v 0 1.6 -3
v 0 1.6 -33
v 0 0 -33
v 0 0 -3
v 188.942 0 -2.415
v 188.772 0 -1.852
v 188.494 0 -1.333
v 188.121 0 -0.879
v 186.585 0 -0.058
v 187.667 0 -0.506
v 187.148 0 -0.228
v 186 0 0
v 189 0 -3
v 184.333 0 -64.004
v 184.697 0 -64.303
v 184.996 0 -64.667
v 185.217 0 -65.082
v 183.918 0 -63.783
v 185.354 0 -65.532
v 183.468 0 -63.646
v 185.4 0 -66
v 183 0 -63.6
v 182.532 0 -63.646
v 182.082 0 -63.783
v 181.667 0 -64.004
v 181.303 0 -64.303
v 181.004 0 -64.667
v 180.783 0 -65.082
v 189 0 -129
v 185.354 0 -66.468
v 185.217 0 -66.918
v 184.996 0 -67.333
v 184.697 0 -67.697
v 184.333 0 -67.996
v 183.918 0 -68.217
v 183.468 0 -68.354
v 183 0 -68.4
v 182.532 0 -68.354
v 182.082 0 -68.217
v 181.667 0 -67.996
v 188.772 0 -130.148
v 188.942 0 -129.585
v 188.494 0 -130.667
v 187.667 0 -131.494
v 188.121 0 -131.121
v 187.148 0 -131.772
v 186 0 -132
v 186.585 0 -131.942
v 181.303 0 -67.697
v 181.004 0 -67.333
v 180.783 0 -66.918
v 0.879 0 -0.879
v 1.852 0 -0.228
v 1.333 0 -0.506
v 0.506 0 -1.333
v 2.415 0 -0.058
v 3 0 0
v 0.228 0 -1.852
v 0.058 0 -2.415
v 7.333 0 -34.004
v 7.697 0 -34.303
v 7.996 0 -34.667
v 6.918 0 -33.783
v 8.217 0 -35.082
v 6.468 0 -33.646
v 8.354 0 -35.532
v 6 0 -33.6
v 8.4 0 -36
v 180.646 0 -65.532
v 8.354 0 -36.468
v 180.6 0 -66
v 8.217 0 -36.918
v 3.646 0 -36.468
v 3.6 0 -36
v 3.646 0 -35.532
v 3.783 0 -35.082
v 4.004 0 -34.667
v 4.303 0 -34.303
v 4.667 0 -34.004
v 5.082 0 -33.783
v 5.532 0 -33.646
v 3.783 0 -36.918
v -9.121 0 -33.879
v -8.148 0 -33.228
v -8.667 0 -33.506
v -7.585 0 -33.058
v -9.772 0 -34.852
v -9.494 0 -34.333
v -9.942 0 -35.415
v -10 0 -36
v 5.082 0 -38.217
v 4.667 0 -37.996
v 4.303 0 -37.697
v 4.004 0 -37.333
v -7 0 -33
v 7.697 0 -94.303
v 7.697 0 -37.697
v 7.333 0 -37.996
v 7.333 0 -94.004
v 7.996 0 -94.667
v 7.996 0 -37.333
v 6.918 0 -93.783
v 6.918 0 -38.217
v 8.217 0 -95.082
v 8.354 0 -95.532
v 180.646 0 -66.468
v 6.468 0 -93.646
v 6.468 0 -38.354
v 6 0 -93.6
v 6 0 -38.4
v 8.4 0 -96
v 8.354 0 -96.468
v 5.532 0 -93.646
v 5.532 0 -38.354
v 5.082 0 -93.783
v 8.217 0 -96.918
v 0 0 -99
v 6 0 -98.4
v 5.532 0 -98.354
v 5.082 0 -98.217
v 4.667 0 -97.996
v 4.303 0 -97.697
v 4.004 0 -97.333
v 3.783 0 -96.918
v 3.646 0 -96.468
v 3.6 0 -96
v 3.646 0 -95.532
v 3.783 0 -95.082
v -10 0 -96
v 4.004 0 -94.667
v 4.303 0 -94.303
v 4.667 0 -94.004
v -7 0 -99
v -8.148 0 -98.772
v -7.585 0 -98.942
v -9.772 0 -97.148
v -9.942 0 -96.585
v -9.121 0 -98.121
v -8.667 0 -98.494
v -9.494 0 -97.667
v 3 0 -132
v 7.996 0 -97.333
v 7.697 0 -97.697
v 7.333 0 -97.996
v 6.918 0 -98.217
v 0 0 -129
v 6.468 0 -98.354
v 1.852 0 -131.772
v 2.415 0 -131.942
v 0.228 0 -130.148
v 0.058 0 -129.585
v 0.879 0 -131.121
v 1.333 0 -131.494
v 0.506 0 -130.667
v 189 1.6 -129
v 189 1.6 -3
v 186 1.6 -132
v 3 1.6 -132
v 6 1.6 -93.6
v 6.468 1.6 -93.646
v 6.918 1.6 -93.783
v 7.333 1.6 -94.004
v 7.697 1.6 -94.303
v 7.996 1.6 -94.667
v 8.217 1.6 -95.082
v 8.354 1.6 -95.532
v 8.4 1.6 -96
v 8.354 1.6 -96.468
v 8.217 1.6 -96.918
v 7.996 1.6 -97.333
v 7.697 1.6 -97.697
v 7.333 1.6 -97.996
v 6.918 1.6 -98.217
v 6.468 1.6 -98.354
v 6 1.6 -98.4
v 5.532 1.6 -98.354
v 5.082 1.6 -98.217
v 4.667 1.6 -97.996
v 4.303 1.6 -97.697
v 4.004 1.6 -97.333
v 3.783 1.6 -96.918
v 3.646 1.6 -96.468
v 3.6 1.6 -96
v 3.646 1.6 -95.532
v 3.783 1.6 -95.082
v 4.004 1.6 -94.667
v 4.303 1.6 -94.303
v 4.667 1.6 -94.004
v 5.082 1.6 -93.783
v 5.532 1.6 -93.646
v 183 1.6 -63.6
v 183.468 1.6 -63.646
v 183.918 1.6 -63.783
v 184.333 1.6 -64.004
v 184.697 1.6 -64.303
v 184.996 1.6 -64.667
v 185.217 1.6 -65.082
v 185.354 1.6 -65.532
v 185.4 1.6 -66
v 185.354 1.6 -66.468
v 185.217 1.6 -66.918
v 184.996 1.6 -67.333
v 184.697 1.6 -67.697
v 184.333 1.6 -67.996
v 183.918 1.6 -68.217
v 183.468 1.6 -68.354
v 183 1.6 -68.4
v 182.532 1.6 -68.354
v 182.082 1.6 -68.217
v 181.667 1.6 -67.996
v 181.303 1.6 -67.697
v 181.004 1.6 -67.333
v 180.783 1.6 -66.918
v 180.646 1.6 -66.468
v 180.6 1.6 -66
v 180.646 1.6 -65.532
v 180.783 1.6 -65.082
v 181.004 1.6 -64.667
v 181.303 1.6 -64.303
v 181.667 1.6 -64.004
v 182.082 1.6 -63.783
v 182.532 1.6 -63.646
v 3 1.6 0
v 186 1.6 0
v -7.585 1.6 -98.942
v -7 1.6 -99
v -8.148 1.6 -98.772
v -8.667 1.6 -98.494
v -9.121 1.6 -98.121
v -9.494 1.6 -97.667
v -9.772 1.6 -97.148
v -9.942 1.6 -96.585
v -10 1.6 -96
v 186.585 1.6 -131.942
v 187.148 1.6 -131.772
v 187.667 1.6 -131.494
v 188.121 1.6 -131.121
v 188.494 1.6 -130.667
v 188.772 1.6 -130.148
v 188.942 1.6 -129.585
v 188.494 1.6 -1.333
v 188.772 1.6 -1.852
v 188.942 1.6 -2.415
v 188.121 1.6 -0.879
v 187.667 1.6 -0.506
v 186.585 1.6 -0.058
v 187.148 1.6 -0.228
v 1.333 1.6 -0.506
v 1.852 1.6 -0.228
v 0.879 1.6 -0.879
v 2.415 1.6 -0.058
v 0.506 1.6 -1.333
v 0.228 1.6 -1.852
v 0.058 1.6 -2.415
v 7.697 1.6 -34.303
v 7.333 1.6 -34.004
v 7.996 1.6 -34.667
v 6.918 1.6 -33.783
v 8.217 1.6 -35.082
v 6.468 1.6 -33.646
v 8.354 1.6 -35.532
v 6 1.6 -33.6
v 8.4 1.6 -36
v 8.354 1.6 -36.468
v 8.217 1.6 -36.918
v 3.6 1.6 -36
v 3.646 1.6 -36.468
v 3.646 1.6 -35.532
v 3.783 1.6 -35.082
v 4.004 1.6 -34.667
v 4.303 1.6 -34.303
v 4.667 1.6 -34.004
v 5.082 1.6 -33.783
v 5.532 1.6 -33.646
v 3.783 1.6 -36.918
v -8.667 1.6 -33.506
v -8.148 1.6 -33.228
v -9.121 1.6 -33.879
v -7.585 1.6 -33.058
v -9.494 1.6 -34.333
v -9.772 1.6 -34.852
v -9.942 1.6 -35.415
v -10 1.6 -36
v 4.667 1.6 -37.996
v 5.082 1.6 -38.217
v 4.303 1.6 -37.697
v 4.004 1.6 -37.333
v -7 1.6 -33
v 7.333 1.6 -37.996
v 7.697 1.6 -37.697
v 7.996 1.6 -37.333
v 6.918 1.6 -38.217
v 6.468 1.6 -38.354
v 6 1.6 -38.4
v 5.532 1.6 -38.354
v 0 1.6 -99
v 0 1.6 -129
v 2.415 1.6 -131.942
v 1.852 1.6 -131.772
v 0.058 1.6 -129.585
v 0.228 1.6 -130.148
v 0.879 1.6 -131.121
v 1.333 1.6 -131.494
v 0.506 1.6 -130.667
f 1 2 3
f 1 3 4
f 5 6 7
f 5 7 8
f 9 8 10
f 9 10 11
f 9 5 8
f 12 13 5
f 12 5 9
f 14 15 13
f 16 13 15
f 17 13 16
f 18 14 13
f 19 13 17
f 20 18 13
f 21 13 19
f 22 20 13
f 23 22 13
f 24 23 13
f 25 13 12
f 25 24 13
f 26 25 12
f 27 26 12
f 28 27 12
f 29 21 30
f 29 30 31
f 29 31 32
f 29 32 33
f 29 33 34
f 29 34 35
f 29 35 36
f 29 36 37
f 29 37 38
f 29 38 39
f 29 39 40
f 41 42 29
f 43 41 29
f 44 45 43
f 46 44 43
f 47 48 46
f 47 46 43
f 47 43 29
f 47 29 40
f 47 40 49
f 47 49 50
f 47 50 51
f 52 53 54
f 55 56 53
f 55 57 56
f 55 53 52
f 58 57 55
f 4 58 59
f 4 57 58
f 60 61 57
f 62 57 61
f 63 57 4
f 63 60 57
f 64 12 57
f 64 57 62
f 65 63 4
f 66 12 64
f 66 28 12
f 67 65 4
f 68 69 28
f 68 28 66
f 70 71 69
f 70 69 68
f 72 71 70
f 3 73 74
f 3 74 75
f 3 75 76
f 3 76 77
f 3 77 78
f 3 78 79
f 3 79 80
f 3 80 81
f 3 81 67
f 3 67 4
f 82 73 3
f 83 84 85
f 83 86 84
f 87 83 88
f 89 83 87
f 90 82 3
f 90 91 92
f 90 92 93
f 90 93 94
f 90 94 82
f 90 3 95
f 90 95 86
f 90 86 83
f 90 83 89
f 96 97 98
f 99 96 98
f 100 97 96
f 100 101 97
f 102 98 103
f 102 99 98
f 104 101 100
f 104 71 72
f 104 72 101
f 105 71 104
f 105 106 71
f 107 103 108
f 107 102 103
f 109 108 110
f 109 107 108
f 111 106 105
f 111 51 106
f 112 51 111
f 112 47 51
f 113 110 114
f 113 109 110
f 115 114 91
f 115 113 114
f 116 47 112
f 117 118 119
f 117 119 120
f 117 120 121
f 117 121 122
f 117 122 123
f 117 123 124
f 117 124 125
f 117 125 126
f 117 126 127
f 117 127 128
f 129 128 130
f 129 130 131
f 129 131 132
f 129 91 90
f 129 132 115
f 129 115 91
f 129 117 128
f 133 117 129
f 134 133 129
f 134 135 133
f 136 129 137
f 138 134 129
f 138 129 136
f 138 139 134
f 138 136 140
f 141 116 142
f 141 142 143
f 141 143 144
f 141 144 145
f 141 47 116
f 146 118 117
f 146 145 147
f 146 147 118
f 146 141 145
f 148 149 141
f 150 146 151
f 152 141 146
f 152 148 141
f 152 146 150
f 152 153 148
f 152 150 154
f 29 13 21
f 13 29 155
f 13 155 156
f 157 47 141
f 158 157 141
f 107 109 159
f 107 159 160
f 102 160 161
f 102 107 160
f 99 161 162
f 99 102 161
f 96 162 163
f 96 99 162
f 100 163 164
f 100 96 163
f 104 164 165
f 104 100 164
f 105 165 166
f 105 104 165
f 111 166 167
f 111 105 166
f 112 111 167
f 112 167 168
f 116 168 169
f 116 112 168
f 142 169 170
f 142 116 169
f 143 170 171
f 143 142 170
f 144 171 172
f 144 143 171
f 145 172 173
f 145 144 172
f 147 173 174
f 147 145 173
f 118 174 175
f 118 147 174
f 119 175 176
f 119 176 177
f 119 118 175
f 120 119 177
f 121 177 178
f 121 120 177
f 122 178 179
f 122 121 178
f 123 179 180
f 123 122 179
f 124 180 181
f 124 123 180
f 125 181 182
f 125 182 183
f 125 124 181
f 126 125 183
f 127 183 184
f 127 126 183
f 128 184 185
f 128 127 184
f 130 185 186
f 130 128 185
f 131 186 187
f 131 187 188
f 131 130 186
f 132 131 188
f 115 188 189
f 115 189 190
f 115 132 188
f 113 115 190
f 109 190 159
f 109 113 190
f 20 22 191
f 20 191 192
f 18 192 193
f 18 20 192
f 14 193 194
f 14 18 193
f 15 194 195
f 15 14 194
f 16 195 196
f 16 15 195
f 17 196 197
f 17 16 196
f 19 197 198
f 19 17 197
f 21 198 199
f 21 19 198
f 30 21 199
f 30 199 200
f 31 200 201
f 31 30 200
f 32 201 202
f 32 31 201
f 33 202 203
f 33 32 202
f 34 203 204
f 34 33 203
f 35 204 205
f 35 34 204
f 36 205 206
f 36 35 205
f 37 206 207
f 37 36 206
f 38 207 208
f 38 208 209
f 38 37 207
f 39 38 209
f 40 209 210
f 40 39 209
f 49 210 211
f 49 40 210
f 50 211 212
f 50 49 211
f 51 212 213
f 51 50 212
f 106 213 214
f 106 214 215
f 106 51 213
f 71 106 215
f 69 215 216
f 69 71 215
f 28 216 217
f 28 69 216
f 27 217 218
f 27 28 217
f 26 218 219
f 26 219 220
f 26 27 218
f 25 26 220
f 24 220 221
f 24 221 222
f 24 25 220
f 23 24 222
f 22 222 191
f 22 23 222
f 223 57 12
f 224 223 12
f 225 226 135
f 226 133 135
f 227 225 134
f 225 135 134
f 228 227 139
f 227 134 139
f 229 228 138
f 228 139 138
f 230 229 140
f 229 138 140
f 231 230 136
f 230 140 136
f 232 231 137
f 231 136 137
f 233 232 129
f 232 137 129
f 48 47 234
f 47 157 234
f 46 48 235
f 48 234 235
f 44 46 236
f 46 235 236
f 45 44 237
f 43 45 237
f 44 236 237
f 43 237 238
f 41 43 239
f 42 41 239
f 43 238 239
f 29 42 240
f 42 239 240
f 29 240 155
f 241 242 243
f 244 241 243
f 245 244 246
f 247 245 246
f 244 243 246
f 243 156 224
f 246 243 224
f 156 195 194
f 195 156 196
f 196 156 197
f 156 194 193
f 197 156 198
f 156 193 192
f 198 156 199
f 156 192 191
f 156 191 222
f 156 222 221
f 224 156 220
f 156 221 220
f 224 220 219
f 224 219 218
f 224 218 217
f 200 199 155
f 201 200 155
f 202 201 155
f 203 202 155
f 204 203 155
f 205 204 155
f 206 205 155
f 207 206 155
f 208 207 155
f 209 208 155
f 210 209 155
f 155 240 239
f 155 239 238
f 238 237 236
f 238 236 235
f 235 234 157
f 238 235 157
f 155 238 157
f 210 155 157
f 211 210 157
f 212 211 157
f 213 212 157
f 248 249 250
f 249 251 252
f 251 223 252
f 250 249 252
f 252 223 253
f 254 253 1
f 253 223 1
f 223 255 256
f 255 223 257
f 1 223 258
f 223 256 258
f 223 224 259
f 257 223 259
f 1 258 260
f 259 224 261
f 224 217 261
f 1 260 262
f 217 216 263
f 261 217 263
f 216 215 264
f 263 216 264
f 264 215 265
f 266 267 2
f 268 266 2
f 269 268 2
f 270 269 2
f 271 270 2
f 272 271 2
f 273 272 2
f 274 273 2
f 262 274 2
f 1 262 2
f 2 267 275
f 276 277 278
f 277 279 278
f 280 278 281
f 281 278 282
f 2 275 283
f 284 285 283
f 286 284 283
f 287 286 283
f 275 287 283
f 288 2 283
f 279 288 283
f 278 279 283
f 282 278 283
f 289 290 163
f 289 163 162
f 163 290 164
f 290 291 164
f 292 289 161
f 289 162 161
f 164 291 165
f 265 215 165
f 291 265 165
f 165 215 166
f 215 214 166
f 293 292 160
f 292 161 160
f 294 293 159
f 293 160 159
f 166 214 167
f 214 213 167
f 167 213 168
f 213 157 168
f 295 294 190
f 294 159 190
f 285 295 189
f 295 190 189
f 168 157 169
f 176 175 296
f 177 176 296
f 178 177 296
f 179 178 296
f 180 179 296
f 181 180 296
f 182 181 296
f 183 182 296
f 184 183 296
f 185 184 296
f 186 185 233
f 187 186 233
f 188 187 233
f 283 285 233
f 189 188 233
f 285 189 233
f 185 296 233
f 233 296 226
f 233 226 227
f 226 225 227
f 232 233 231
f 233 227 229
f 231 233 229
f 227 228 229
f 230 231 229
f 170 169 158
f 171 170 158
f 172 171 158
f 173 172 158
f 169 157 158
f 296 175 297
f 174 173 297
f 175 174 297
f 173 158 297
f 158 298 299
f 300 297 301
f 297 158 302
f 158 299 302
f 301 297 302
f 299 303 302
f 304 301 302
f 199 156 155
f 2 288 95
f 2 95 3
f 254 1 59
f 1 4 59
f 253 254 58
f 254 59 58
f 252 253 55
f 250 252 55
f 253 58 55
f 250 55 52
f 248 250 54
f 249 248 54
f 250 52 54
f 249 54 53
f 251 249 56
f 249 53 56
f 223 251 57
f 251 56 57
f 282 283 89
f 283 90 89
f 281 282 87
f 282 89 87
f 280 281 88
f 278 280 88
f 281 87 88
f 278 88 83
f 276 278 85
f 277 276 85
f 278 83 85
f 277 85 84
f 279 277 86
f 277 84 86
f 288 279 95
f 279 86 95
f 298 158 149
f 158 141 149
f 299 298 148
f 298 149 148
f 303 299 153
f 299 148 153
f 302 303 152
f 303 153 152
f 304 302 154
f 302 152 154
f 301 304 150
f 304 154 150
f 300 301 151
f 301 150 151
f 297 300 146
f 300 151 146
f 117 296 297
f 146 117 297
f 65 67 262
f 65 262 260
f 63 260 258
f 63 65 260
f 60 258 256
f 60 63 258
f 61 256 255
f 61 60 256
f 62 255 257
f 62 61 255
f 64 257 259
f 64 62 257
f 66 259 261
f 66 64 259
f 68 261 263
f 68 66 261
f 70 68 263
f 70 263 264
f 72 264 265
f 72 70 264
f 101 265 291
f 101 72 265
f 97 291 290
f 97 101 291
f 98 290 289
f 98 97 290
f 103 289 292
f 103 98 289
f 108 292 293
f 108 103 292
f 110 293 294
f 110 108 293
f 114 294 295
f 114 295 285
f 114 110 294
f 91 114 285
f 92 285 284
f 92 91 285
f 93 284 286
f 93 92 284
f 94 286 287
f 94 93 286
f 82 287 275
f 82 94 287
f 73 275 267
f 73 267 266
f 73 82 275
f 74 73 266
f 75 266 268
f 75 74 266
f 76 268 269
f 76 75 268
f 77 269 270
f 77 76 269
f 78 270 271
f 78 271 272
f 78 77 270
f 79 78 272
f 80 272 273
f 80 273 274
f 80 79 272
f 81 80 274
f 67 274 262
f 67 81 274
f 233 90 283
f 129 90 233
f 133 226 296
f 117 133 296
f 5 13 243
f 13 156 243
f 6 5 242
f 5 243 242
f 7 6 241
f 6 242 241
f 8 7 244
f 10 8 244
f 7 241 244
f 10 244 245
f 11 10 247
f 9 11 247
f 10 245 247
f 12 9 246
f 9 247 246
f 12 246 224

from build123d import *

# Parameters (mm, degrees)
SKETCH1_R           = 2.4
BOSS_EXTRUDE1_DEPTH = 1.6
CUT_EXTRUDE1_REACH  = 232.538
SKETCH2_W           = 10
SKETCH2_H           = 33
FILLET1_R           = 3


with BuildPart() as part:
    # Sketch1 → Boss-Extrude1 (new body)
    with BuildSketch(Plane(origin=(0, 0, 0), x_dir=(1, 0, 0), z_dir=(0, 1, 0))):
        Polygon((0, 132), (189, 132), (189, 0), (0, 0), (-10, 0), (-10, 132), align=None)
        with Locations(Location((6, 96, 0), (0, 0, 270))):
            Circle(SKETCH1_R, mode=Mode.SUBTRACT)
        with Locations(Location((6, 36, 0), (0, 0, 270))):
            Circle(SKETCH1_R, mode=Mode.SUBTRACT)
        with Locations(Location((183, 66, 0), (0, 0, 270))):
            Circle(SKETCH1_R, mode=Mode.SUBTRACT)
    extrude(amount=BOSS_EXTRUDE1_DEPTH)

    # Sketch2 → Cut-Extrude1 (cut, up to next)
    with BuildSketch(Plane(origin=(0, 1.6, 0), x_dir=(1, 0, 0), z_dir=(0, 1, 0)), mode=Mode.PRIVATE) as cut_extrude1_sk1:
        with Locations((-5, 115.5)):
            Rectangle(SKETCH2_W, SKETCH2_H)
    cut_extrude1_tool1 = extrude(cut_extrude1_sk1.sketch, amount=-CUT_EXTRUDE1_REACH, mode=Mode.PRIVATE) & part.part
    cut_extrude1 = cut_extrude1_tool1.solids().sort_by_distance((-5, 1.6, -115.5))[0]
    add(cut_extrude1, mode=Mode.SUBTRACT)

    # Mirror1: Cut-Extrude1 across plane
    add(cut_extrude1.mirror(Plane.XY.offset(-66)), mode=Mode.SUBTRACT)

    # Fillet1
    fillet1_edges = [part.edges().sort_by_distance(p)[0] for p in [
        (189, 0.8, -132),
        (189, 0.8, 0),
        (-10, 0.8, -99),
        (0, 0.8, -132),
        (-10, 0.8, -33),
        (0, 0.8, 0),
    ]]
    fillet(fillet1_edges, radius=FILLET1_R)


solid = part.part
